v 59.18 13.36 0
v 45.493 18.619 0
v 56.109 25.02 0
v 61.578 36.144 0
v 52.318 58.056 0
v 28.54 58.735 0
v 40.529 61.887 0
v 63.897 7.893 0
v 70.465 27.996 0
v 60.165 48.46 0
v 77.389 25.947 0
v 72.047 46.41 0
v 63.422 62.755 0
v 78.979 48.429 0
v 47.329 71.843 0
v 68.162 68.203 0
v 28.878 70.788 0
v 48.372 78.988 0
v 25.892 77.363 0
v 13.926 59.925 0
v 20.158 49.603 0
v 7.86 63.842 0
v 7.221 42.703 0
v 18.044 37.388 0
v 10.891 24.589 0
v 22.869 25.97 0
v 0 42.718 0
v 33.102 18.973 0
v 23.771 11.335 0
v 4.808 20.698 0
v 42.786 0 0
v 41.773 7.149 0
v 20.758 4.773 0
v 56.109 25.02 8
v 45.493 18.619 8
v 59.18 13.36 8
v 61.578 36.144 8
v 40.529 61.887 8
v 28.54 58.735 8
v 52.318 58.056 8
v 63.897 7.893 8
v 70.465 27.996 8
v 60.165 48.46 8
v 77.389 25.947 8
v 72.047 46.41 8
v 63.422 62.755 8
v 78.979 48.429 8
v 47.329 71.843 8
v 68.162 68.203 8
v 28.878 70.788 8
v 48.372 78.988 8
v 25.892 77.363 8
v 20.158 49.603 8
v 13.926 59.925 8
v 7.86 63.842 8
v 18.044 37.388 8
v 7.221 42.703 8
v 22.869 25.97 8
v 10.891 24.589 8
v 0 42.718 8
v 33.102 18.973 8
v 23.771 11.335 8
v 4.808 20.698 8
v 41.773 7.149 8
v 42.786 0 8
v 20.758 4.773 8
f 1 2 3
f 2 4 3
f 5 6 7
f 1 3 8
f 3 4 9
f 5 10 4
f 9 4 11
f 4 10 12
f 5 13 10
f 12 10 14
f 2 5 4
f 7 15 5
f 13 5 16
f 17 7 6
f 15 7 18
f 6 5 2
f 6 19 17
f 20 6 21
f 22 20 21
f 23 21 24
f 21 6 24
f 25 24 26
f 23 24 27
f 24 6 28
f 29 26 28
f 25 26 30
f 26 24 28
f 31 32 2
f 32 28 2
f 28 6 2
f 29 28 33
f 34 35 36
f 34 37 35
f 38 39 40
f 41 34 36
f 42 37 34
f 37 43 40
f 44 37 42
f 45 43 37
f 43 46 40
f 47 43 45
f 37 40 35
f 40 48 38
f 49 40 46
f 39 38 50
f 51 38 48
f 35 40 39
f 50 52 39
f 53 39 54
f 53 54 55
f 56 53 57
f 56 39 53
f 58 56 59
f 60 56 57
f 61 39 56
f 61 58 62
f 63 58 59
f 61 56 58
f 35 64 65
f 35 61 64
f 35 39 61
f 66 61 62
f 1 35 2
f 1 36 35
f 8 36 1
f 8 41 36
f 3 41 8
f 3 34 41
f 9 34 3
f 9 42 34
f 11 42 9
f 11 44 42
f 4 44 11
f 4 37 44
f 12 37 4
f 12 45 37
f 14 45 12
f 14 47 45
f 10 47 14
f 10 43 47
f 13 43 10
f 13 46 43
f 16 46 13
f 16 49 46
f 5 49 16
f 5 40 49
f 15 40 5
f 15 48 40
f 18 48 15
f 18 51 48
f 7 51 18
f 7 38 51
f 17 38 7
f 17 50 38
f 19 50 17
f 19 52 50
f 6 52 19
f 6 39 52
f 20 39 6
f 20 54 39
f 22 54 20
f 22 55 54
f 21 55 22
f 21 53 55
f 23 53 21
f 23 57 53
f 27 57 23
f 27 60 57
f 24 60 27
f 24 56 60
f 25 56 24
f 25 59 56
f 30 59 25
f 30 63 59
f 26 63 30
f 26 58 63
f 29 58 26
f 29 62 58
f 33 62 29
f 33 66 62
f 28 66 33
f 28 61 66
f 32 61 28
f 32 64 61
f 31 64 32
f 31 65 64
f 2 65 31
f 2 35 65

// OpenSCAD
$fn = 32;

// ----------------------------------------------------------------------
// Fan rotor section: 11 blades, 22 mm hub radius, 18 mm blades
// ----------------------------------------------------------------------

// --- parameters (mm) ---
profile_height = 8;       // extrusion height
profile_points = 33;      // points of the closed outline

profile = [[61.578, 36.144], [72.047, 46.41], [78.979, 48.429], [60.165, 48.46], [63.422, 62.755], [68.162, 68.203], [52.318, 58.056], [47.329, 71.843], [48.372, 78.988], [40.529, 61.887], [28.878, 70.788], [25.892, 77.363], [28.54, 58.735], [13.926, 59.925], [7.86, 63.842], [20.158, 49.603], [7.221, 42.703], [0, 42.718], [18.044, 37.388], [10.891, 24.589], [4.808, 20.698], [22.869, 25.97], [23.771, 11.335], [20.758, 4.773], [33.102, 18.973], [41.773, 7.149], [42.786, 0], [45.493, 18.619], [59.18, 13.36], [63.897, 7.893], [56.109, 25.02], [70.465, 27.996], [77.389, 25.947]];  // single closed polygon, 33 points, counter clockwise

// --- the one profile operation ---
linear_extrude(height = profile_height) polygon(points = profile);
